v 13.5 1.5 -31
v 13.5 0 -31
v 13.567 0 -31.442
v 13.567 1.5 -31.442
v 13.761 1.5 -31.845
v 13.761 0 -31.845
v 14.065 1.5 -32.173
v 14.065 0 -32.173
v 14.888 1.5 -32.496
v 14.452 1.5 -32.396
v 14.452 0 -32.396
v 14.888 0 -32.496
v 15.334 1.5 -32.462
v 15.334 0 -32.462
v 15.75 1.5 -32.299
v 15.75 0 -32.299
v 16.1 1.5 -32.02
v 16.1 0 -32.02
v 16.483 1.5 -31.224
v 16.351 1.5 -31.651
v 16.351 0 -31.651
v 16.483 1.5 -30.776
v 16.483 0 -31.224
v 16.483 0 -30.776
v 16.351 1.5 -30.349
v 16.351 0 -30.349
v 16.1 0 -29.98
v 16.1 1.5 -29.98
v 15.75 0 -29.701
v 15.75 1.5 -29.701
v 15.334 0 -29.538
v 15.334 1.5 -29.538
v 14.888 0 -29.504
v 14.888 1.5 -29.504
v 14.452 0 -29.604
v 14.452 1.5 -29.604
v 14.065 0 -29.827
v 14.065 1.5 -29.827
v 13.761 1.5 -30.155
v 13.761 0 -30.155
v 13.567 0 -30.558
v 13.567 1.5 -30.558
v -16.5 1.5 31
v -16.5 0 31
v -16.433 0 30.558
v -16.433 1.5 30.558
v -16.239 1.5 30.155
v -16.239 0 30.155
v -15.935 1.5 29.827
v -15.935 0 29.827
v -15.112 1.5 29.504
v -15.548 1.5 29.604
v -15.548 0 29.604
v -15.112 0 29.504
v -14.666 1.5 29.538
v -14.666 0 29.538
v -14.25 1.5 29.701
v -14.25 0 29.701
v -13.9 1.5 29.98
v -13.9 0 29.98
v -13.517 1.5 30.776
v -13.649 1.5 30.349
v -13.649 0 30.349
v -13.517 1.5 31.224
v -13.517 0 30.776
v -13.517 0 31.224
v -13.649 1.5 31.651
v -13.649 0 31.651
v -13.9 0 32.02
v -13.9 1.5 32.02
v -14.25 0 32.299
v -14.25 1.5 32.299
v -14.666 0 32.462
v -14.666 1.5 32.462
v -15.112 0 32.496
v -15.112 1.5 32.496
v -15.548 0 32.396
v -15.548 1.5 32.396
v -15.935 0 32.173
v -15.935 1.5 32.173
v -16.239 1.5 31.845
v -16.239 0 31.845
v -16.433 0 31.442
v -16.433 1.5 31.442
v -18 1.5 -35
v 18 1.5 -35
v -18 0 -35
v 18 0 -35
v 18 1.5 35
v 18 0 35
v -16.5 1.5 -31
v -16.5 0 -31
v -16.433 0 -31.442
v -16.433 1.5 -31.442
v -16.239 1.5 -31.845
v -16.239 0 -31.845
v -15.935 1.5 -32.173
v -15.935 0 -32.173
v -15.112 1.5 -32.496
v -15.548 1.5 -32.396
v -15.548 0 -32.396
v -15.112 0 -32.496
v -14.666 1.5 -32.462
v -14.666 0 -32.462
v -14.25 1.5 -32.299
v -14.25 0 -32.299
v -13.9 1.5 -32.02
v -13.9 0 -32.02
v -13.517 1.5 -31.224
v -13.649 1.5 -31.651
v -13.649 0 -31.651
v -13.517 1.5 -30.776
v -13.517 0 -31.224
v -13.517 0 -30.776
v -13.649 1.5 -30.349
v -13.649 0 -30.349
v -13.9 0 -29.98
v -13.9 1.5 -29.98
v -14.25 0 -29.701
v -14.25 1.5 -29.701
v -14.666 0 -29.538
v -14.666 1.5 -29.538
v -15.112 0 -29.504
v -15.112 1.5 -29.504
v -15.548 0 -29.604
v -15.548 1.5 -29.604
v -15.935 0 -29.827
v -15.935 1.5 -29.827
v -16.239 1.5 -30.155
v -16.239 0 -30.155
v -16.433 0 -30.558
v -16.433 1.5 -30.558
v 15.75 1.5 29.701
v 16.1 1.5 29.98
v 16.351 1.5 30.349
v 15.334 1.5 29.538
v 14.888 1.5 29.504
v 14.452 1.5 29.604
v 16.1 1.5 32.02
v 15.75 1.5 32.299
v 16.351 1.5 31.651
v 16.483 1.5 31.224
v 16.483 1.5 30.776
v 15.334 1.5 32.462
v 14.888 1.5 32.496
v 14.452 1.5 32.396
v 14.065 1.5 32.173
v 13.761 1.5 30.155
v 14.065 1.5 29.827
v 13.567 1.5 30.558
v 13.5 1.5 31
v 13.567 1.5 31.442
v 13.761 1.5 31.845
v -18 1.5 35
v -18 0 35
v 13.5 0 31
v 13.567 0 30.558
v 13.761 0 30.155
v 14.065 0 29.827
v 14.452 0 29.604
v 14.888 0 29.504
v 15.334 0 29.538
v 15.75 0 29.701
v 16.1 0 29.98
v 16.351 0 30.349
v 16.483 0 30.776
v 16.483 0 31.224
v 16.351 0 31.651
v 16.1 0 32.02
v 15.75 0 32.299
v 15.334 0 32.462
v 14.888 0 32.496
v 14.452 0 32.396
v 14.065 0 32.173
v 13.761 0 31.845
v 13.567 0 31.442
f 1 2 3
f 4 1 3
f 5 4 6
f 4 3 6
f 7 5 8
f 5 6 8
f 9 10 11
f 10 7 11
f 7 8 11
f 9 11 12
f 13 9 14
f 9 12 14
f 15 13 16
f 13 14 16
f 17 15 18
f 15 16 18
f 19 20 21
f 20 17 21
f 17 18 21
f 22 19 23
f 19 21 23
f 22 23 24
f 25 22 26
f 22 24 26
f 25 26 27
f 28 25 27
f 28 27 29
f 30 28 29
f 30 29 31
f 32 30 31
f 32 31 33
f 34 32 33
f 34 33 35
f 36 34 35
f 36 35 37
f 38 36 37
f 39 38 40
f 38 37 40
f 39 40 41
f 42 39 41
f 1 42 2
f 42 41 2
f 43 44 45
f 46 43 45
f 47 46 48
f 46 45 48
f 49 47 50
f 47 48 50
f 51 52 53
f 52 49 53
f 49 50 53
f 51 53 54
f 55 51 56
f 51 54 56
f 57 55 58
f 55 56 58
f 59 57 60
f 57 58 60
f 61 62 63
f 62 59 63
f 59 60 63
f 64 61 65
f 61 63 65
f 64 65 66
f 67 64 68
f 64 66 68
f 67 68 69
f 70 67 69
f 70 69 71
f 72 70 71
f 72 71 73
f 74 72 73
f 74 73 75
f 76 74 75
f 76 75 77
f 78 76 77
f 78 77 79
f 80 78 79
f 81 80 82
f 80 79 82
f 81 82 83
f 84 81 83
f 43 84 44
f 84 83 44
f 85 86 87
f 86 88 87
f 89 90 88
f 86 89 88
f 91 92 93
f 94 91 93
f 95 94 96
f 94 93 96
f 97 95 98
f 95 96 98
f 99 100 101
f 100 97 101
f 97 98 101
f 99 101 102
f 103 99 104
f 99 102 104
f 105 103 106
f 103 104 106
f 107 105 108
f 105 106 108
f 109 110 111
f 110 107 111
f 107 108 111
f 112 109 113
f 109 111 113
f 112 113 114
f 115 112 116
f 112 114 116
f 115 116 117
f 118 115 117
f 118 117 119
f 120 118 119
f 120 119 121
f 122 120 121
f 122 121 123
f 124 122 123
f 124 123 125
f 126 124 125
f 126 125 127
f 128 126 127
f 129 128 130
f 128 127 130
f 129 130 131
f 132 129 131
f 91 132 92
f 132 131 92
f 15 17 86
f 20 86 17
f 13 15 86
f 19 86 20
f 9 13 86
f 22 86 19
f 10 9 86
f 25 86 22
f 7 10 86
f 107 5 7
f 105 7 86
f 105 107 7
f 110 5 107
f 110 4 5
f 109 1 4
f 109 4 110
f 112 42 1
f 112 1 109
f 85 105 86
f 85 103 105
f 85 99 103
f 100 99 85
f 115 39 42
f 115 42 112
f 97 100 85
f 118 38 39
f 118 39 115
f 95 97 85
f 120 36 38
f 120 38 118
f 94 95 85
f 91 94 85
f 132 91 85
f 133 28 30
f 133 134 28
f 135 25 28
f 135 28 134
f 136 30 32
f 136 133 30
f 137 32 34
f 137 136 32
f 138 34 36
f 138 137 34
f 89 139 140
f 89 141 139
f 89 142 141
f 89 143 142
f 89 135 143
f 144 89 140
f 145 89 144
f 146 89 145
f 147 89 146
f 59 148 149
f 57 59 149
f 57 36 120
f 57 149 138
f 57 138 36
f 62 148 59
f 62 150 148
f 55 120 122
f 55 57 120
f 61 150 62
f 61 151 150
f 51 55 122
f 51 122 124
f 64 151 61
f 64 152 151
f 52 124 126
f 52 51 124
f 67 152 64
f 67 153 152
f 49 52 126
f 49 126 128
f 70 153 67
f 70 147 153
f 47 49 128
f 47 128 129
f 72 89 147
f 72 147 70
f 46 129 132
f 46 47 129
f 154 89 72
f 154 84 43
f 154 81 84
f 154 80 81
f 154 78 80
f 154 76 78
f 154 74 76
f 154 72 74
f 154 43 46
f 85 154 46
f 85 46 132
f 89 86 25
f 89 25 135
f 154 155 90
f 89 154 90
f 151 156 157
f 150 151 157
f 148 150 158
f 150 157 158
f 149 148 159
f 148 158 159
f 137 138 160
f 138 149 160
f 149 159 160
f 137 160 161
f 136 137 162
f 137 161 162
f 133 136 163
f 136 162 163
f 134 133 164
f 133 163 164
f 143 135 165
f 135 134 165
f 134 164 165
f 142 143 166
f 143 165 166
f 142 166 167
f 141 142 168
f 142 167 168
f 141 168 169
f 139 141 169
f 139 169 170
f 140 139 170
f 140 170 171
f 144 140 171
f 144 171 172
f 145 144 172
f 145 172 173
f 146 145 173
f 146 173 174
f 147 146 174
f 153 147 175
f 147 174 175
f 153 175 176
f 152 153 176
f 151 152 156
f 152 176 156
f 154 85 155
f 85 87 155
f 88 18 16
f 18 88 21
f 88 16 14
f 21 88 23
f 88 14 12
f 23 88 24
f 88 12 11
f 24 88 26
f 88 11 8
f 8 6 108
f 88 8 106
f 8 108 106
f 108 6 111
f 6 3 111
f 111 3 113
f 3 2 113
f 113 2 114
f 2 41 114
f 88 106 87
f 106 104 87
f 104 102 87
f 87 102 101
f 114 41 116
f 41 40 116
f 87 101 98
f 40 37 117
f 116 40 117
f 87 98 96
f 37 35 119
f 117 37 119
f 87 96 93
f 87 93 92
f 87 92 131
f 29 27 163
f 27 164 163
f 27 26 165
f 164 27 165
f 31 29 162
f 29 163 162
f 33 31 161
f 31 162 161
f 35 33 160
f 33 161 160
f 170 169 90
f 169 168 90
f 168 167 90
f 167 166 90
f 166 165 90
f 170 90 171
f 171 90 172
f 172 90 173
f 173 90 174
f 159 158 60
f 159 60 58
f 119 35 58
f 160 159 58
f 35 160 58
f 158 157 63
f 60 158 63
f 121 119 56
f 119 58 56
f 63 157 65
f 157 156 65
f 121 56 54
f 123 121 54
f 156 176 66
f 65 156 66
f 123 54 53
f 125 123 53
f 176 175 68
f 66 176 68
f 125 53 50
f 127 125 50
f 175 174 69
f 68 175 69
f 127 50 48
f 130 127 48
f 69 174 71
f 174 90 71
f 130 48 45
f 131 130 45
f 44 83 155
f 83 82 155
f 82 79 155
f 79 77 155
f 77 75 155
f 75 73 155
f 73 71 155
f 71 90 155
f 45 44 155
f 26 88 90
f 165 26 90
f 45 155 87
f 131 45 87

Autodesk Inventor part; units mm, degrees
ref_plane "YZ Plane" through (0, 0, 0) normal (1, 0, 0) x (0, 1, 0)
ref_plane "XZ Plane" through (0, 0, 0) normal (0, 1, 0) x (-1, 0, 0)
ref_plane "XY Plane" through (0, 0, 0) normal (0, 0, 1) x (1, 0, 0)
sketch "Эскиз1" plane through (0, 0, 0) normal (0, 1, 0) x (-1, 0, 0)
  line L0 (-18, -35) -> (18, -35)
  line L1 (18, -35) -> (18, 35)
  line L2 (18, 35) -> (-18, 35)
  line L3 (-18, 35) -> (-18, -35)
  line L4 (-18, -35) -> (18, 35) construction
  line L5 (18, -35) -> (-18, 35) construction
  line L6 (-15, -31) -> (15, -31) construction
  line L7 (15, -31) -> (15, 31) construction
  line L8 (15, 31) -> (-15, 31) construction
  line L9 (-15, 31) -> (-15, -31) construction
  line L10 (-15, -31) -> (15, 31) construction
  line L11 (15, -31) -> (-15, 31) construction
  circle A0 centre (15, 31) radius 1.5
  circle A1 centre (15, -31) radius 1.5
  circle A2 centre (-15, -31) radius 1.5
  circle A3 centre (-15, 31) radius 1.5
  point P0 (0, 0)
  dimension "d0" = 36
  dimension "d1" = 70
  dimension "d2" = 62
  dimension "d3" = 30
  dimension "d4" = 3
  dimension "d5" = 3
  dimension "d6" = 3
  dimension "d7" = 3
extrude "Выдавливание1" add sketch "Эскиз1" along normal blind 1.5
properties part number "DC-DC"
